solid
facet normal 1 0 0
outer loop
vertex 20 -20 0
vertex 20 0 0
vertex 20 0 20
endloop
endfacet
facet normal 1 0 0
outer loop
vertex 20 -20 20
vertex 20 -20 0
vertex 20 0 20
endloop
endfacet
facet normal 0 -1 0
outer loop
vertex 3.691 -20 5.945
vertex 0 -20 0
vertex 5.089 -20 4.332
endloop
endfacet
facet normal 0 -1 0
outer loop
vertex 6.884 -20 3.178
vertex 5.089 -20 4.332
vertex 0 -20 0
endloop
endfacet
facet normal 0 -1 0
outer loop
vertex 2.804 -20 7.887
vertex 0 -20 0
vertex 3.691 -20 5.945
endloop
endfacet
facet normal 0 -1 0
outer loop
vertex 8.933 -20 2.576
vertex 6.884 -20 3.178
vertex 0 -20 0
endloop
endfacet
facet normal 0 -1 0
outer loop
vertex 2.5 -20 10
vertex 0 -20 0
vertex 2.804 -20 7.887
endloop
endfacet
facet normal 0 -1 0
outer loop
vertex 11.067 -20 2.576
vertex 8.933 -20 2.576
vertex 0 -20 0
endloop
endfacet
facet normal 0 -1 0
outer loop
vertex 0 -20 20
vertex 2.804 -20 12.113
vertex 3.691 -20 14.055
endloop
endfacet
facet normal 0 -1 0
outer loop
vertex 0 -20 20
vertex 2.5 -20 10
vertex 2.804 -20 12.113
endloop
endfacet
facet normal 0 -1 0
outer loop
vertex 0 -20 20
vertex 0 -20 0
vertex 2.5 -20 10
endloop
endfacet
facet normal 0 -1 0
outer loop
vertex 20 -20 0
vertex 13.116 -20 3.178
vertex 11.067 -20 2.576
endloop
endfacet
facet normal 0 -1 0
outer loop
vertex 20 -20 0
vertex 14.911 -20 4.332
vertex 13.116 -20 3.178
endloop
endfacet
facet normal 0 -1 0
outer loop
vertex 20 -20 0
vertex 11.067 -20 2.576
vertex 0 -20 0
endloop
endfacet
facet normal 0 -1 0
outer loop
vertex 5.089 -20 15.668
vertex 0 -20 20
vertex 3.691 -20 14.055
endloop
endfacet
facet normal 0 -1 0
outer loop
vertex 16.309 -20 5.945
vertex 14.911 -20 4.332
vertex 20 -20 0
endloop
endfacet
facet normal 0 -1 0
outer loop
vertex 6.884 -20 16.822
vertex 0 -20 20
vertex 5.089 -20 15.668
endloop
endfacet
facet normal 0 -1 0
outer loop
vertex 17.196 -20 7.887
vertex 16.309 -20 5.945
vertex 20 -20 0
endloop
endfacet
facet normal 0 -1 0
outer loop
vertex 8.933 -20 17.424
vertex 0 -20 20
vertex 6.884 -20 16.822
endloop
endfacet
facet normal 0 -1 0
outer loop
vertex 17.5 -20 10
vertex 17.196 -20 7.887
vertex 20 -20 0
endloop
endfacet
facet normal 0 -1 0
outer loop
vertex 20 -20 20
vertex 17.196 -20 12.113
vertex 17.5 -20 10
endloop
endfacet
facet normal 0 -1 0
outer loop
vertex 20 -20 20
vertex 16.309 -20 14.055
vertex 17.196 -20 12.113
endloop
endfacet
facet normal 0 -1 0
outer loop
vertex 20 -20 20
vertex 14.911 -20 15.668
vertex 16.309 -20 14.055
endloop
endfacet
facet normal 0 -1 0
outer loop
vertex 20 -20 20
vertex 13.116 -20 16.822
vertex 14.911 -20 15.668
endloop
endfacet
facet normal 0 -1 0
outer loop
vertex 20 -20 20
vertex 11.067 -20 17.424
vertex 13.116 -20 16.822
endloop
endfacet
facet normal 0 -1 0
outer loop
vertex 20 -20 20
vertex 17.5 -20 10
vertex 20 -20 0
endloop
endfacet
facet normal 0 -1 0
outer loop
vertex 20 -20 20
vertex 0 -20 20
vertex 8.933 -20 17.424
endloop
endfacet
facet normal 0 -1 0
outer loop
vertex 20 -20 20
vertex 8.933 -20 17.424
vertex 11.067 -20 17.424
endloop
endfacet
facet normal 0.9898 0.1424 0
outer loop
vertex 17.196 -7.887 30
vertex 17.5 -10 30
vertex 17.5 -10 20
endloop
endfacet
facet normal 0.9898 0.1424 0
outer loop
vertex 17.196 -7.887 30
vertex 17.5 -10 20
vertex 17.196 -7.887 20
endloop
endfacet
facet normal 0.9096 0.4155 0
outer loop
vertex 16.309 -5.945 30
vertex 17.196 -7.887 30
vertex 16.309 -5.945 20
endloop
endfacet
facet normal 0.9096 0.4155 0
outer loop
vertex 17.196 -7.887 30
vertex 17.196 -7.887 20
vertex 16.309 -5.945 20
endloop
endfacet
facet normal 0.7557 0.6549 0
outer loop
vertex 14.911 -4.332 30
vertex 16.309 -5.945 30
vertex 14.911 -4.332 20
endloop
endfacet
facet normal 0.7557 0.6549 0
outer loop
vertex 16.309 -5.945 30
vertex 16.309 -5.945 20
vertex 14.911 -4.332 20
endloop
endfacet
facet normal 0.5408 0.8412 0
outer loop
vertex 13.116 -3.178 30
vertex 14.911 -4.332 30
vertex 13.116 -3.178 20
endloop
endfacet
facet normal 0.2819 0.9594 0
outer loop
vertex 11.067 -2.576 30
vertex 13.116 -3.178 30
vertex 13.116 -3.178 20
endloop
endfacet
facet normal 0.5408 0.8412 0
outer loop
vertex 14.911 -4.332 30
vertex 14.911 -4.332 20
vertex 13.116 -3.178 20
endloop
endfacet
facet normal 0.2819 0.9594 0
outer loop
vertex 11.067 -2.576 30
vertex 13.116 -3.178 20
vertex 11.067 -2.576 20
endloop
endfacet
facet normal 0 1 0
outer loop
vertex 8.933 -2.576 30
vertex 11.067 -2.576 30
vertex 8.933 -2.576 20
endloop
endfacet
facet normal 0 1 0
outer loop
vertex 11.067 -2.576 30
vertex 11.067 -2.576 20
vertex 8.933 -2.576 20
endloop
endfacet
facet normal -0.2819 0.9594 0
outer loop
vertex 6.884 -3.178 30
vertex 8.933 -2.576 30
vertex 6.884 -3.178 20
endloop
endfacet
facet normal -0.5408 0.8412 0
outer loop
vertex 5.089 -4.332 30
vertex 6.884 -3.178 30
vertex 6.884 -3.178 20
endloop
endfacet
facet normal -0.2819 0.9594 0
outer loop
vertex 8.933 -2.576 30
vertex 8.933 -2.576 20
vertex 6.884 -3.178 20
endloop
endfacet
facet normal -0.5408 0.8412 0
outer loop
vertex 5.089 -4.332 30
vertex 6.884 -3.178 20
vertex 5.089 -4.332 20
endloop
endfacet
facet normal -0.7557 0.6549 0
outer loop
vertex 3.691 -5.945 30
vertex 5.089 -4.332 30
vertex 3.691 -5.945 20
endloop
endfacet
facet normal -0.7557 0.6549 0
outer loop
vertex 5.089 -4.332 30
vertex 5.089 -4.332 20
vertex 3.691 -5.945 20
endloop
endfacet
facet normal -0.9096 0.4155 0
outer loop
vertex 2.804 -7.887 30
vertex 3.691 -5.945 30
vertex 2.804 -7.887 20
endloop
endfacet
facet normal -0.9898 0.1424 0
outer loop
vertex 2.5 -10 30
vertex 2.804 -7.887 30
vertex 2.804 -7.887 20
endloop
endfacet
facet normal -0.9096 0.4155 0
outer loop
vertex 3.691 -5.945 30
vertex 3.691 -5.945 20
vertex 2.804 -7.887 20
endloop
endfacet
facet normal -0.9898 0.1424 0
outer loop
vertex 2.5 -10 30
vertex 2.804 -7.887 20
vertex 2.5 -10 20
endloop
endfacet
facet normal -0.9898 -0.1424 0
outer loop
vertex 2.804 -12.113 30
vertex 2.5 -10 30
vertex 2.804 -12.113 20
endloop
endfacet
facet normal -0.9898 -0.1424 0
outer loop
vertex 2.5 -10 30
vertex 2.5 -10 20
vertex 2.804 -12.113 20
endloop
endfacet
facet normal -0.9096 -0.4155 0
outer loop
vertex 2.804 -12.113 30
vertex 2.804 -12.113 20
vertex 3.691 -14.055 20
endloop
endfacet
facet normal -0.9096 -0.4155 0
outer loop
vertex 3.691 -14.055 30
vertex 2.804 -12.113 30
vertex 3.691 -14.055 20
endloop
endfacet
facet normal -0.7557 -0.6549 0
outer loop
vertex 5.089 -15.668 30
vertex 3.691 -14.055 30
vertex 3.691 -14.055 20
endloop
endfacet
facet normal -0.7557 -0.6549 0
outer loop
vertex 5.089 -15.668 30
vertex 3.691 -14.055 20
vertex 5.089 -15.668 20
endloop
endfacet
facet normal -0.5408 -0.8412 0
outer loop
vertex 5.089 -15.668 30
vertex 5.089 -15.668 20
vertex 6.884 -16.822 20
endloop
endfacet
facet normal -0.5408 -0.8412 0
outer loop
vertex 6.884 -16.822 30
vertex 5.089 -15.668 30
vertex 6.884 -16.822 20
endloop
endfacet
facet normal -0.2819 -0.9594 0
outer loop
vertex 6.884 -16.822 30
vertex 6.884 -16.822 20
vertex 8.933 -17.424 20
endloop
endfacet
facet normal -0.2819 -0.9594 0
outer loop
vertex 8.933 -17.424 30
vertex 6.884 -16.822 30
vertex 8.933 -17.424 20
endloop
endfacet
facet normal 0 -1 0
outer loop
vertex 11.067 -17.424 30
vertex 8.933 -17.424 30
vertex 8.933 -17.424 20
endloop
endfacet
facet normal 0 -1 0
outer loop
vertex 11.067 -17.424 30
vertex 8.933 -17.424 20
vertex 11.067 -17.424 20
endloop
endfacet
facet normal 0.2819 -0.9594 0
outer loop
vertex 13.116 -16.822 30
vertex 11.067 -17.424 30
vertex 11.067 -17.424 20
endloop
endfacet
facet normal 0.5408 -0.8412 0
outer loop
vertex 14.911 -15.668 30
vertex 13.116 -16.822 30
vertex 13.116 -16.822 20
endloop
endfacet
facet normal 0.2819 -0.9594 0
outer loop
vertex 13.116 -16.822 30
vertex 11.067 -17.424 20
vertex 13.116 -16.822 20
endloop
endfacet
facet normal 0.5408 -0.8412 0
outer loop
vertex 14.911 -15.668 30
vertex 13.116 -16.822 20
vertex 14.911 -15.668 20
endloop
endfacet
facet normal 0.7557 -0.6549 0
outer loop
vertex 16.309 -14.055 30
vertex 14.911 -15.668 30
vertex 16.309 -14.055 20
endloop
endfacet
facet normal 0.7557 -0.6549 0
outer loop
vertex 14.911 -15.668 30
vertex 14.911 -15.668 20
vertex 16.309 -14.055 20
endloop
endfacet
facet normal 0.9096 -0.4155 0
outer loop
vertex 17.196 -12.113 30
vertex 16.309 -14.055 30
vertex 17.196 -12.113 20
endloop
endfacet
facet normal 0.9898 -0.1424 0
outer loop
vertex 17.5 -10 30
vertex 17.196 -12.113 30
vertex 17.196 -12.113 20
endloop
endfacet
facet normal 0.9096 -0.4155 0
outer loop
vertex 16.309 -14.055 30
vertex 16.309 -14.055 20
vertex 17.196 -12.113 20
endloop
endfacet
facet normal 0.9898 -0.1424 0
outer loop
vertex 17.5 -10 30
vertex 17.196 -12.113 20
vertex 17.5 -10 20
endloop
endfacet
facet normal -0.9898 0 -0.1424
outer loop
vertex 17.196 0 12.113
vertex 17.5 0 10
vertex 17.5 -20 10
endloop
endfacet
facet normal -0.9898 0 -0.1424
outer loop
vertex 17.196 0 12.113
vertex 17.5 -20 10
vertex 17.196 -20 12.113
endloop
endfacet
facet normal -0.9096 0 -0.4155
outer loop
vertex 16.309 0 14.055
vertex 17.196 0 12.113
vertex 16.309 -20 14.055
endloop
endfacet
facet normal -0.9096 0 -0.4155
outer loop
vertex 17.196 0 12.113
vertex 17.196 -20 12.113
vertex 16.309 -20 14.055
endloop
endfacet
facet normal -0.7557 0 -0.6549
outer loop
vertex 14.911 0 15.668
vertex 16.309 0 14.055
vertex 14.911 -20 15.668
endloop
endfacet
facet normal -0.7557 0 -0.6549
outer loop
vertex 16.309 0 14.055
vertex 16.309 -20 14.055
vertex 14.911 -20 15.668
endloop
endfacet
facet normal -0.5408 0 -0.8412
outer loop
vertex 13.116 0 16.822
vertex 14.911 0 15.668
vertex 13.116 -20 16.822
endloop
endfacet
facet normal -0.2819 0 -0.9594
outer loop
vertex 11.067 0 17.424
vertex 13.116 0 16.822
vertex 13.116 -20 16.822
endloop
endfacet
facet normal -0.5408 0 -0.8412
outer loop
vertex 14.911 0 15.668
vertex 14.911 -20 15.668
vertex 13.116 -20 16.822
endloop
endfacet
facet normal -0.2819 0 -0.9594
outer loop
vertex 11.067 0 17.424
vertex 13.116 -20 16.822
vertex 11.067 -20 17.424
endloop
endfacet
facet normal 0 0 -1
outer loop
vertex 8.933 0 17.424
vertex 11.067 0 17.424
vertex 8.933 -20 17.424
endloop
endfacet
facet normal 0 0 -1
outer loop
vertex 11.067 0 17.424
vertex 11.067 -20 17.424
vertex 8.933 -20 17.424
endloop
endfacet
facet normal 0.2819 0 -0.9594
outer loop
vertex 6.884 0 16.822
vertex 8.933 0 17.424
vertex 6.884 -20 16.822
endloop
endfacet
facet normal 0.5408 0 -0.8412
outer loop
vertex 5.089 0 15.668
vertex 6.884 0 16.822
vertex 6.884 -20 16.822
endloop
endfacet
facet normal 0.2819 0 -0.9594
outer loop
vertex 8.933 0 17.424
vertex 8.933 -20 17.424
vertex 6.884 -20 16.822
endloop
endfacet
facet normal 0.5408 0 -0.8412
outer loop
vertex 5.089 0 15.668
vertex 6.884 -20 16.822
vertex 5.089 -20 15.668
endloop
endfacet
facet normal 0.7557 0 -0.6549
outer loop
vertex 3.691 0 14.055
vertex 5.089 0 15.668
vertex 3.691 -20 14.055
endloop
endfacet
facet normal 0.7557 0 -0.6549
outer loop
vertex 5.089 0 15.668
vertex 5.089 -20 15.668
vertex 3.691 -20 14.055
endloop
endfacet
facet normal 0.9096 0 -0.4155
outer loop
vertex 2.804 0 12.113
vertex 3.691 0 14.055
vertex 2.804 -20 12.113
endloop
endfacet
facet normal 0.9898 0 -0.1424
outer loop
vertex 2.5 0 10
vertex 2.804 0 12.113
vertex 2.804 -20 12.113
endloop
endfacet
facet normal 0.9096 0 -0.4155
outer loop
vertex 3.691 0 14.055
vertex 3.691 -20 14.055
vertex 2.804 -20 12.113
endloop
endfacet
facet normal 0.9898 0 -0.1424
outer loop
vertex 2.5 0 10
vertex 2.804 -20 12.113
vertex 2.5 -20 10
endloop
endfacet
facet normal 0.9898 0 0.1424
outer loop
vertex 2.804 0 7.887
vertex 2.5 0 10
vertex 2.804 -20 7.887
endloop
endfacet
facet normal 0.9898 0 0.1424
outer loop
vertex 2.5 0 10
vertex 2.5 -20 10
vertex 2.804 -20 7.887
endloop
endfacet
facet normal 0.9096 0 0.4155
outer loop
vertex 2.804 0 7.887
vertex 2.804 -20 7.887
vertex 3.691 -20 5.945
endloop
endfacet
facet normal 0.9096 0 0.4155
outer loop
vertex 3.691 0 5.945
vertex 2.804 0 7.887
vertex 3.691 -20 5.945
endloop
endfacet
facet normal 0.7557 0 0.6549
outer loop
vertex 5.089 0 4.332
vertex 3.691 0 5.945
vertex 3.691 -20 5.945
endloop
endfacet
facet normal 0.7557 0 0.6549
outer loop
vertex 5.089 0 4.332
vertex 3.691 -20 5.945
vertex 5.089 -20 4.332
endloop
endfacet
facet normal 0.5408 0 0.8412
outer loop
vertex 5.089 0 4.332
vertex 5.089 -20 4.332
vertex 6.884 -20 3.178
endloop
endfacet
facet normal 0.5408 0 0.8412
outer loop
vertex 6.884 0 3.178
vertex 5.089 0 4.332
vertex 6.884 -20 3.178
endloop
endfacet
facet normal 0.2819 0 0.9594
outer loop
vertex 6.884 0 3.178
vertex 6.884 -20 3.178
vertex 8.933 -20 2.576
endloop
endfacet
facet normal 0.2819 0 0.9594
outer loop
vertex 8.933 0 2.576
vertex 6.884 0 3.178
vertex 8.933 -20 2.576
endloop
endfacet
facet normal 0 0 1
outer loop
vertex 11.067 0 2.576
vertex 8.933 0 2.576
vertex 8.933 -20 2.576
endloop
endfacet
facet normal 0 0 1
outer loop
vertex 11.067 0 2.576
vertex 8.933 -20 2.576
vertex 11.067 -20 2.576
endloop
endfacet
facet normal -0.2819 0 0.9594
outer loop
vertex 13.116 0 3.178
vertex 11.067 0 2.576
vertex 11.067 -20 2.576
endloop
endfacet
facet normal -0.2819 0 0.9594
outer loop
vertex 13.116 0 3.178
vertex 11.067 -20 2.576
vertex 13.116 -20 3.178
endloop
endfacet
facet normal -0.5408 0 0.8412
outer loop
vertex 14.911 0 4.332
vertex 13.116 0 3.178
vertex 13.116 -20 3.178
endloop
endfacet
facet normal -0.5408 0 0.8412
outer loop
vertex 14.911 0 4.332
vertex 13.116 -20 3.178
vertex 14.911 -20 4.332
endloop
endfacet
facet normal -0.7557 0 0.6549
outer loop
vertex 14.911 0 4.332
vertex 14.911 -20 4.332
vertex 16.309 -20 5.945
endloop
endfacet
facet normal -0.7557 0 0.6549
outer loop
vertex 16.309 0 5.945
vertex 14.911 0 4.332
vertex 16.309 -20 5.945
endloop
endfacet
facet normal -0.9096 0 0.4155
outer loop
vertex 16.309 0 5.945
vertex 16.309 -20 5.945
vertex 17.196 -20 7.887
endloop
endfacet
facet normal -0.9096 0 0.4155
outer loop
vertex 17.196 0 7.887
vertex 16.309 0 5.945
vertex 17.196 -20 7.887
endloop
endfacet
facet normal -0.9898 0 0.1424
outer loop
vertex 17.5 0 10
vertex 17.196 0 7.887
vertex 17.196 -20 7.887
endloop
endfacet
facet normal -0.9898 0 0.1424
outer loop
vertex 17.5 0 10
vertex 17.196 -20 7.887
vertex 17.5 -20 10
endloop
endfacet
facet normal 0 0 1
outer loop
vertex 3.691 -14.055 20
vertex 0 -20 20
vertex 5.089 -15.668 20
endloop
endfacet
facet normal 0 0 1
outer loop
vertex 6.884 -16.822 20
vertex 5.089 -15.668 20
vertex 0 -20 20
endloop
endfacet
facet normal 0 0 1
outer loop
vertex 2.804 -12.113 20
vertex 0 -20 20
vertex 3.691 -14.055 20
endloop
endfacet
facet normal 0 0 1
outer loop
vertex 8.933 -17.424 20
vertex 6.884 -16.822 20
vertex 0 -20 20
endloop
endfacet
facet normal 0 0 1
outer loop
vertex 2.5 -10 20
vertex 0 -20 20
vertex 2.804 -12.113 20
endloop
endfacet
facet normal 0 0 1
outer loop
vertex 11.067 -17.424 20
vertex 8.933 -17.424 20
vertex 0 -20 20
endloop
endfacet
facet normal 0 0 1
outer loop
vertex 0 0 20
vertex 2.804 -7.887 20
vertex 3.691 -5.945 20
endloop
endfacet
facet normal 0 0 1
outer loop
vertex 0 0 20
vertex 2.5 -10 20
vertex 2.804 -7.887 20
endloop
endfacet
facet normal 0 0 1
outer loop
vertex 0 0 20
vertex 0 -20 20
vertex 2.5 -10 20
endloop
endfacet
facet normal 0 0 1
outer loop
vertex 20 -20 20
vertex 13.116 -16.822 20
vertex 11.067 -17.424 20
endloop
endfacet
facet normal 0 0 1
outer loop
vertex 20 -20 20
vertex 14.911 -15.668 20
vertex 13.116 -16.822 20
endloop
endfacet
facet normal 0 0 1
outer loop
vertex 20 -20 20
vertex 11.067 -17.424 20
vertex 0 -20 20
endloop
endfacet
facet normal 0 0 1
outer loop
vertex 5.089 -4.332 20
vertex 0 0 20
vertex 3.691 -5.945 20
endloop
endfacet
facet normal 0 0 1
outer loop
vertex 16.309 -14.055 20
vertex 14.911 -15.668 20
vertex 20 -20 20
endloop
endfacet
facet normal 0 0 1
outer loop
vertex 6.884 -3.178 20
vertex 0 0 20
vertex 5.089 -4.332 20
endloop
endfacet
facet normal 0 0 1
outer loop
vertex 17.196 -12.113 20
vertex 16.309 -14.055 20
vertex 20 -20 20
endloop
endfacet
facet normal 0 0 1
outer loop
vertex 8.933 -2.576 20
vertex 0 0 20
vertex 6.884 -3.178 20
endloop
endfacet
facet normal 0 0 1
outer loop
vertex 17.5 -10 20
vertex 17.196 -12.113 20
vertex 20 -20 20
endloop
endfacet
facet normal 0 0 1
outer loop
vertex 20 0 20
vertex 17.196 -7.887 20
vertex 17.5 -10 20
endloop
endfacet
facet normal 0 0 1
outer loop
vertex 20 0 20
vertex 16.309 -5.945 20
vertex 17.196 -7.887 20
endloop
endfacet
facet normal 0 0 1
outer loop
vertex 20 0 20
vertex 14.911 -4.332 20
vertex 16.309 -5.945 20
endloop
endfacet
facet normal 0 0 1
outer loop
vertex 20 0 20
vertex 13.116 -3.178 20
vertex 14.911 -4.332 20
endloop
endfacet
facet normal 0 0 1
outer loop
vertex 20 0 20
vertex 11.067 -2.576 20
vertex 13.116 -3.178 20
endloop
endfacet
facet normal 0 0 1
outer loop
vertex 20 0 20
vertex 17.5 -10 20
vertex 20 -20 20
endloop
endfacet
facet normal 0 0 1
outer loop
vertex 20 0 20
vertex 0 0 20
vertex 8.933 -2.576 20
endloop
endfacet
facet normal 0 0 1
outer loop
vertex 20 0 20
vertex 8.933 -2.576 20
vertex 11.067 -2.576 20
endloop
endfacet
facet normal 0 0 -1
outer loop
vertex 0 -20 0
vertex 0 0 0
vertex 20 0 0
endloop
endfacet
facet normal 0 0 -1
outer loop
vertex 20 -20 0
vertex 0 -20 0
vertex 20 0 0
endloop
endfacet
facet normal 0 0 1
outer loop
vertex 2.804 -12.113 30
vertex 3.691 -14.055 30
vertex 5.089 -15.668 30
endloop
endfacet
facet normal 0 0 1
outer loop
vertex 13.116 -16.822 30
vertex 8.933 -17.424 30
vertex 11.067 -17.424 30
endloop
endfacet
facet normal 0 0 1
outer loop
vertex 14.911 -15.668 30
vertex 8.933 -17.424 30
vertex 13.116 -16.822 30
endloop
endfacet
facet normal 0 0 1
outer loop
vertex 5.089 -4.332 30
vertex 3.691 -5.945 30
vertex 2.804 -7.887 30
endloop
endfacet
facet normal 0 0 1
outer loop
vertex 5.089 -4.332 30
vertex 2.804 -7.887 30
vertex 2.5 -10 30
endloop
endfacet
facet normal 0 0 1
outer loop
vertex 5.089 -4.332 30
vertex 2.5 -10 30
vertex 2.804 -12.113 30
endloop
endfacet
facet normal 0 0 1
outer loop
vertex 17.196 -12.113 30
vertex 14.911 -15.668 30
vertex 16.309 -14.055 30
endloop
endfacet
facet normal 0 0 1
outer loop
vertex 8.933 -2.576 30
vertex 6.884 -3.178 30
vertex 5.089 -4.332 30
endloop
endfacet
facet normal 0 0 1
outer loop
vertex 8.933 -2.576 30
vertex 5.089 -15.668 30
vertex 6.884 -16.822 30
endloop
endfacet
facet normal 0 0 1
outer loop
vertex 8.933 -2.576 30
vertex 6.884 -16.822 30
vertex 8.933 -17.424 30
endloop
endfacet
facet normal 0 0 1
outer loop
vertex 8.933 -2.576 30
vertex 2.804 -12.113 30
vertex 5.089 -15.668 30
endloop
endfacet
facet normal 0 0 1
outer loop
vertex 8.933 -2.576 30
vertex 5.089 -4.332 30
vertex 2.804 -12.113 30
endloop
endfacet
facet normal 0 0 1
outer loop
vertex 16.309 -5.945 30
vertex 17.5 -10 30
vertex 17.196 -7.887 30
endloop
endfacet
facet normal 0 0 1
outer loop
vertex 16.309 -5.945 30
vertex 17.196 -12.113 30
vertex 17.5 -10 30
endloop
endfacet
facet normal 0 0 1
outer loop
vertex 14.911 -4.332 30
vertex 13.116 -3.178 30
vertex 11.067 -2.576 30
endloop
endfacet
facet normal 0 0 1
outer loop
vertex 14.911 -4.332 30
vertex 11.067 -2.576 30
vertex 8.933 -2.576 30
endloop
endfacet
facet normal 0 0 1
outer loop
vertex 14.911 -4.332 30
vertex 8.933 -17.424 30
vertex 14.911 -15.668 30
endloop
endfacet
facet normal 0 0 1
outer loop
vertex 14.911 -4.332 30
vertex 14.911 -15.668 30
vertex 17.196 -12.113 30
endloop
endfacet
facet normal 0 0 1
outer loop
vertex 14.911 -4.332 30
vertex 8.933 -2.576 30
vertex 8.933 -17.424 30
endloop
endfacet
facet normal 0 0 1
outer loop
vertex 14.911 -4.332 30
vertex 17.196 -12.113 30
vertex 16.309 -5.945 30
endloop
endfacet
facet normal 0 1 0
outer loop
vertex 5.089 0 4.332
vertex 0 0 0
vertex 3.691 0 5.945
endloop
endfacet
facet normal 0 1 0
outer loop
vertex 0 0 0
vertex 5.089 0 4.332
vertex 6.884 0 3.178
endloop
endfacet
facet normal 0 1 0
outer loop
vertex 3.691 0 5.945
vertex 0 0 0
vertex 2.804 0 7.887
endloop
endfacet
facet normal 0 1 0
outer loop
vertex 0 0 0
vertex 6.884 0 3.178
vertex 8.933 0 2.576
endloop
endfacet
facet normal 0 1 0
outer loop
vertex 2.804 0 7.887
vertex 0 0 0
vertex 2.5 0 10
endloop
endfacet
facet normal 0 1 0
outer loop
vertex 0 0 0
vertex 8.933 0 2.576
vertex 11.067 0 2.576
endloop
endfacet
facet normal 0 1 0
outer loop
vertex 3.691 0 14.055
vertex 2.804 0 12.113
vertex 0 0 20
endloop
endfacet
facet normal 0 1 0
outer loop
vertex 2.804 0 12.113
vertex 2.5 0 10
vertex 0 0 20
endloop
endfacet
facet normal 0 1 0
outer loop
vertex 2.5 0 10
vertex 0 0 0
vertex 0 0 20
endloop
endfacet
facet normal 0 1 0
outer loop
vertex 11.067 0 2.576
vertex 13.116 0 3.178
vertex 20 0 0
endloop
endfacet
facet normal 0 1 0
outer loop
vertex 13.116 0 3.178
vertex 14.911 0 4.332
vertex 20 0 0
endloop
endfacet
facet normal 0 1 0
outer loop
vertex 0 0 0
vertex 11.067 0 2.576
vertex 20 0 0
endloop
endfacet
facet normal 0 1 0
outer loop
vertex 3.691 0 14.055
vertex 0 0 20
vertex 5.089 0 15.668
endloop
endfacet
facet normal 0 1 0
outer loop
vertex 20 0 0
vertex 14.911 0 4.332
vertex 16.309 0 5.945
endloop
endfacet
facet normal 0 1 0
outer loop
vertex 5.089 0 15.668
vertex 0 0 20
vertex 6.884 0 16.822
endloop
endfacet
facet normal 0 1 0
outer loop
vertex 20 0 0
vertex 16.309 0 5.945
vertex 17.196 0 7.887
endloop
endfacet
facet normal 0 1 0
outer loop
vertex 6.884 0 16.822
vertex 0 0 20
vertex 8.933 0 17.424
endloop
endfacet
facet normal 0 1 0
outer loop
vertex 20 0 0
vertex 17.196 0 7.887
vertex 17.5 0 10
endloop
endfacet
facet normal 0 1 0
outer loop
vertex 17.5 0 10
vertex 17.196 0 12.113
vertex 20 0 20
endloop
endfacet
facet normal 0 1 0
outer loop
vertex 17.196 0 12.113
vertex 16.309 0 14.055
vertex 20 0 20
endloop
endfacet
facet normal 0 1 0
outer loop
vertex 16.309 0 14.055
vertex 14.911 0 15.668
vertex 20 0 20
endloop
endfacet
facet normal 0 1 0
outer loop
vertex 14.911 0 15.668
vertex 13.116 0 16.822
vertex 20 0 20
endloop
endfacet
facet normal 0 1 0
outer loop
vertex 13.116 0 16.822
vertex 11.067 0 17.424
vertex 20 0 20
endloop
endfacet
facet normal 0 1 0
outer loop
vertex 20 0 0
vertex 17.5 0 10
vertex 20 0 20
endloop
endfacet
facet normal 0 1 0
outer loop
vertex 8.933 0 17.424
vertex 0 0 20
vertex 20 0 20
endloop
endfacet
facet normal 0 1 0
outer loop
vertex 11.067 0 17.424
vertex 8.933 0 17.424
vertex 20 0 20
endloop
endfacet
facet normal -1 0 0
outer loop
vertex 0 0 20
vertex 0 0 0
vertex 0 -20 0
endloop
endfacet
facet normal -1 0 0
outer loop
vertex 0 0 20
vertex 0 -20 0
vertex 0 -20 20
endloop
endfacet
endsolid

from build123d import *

# Parameters (mm, degrees)
F0_W     = 20
F0_H     = 20
F1_DEPTH = 20
F2_R     = 7.5
F3_DEPTH = 10
F4_R     = 7.5
F5_DEPTH = 25


with BuildPart() as f1:
    # F0 (on Front) → F1 (new body)
    with BuildSketch(Plane.XZ):
        with Locations((10, 10)):
            Rectangle(F0_W, F0_H)
    extrude(amount=F1_DEPTH)

    # F2 (on face) → F3 (join)
    with BuildSketch(Plane.XY.offset(20)):
        with Locations((10, -10)):
            Circle(F2_R)
    extrude(amount=F3_DEPTH)

    # F4 (on face) → F5 (cut)
    with BuildSketch(Plane.XZ.offset(20)):
        with Locations((10, 10)):
            Circle(F4_R)
    extrude(amount=-F5_DEPTH, mode=Mode.SUBTRACT)


solid = f1.part
